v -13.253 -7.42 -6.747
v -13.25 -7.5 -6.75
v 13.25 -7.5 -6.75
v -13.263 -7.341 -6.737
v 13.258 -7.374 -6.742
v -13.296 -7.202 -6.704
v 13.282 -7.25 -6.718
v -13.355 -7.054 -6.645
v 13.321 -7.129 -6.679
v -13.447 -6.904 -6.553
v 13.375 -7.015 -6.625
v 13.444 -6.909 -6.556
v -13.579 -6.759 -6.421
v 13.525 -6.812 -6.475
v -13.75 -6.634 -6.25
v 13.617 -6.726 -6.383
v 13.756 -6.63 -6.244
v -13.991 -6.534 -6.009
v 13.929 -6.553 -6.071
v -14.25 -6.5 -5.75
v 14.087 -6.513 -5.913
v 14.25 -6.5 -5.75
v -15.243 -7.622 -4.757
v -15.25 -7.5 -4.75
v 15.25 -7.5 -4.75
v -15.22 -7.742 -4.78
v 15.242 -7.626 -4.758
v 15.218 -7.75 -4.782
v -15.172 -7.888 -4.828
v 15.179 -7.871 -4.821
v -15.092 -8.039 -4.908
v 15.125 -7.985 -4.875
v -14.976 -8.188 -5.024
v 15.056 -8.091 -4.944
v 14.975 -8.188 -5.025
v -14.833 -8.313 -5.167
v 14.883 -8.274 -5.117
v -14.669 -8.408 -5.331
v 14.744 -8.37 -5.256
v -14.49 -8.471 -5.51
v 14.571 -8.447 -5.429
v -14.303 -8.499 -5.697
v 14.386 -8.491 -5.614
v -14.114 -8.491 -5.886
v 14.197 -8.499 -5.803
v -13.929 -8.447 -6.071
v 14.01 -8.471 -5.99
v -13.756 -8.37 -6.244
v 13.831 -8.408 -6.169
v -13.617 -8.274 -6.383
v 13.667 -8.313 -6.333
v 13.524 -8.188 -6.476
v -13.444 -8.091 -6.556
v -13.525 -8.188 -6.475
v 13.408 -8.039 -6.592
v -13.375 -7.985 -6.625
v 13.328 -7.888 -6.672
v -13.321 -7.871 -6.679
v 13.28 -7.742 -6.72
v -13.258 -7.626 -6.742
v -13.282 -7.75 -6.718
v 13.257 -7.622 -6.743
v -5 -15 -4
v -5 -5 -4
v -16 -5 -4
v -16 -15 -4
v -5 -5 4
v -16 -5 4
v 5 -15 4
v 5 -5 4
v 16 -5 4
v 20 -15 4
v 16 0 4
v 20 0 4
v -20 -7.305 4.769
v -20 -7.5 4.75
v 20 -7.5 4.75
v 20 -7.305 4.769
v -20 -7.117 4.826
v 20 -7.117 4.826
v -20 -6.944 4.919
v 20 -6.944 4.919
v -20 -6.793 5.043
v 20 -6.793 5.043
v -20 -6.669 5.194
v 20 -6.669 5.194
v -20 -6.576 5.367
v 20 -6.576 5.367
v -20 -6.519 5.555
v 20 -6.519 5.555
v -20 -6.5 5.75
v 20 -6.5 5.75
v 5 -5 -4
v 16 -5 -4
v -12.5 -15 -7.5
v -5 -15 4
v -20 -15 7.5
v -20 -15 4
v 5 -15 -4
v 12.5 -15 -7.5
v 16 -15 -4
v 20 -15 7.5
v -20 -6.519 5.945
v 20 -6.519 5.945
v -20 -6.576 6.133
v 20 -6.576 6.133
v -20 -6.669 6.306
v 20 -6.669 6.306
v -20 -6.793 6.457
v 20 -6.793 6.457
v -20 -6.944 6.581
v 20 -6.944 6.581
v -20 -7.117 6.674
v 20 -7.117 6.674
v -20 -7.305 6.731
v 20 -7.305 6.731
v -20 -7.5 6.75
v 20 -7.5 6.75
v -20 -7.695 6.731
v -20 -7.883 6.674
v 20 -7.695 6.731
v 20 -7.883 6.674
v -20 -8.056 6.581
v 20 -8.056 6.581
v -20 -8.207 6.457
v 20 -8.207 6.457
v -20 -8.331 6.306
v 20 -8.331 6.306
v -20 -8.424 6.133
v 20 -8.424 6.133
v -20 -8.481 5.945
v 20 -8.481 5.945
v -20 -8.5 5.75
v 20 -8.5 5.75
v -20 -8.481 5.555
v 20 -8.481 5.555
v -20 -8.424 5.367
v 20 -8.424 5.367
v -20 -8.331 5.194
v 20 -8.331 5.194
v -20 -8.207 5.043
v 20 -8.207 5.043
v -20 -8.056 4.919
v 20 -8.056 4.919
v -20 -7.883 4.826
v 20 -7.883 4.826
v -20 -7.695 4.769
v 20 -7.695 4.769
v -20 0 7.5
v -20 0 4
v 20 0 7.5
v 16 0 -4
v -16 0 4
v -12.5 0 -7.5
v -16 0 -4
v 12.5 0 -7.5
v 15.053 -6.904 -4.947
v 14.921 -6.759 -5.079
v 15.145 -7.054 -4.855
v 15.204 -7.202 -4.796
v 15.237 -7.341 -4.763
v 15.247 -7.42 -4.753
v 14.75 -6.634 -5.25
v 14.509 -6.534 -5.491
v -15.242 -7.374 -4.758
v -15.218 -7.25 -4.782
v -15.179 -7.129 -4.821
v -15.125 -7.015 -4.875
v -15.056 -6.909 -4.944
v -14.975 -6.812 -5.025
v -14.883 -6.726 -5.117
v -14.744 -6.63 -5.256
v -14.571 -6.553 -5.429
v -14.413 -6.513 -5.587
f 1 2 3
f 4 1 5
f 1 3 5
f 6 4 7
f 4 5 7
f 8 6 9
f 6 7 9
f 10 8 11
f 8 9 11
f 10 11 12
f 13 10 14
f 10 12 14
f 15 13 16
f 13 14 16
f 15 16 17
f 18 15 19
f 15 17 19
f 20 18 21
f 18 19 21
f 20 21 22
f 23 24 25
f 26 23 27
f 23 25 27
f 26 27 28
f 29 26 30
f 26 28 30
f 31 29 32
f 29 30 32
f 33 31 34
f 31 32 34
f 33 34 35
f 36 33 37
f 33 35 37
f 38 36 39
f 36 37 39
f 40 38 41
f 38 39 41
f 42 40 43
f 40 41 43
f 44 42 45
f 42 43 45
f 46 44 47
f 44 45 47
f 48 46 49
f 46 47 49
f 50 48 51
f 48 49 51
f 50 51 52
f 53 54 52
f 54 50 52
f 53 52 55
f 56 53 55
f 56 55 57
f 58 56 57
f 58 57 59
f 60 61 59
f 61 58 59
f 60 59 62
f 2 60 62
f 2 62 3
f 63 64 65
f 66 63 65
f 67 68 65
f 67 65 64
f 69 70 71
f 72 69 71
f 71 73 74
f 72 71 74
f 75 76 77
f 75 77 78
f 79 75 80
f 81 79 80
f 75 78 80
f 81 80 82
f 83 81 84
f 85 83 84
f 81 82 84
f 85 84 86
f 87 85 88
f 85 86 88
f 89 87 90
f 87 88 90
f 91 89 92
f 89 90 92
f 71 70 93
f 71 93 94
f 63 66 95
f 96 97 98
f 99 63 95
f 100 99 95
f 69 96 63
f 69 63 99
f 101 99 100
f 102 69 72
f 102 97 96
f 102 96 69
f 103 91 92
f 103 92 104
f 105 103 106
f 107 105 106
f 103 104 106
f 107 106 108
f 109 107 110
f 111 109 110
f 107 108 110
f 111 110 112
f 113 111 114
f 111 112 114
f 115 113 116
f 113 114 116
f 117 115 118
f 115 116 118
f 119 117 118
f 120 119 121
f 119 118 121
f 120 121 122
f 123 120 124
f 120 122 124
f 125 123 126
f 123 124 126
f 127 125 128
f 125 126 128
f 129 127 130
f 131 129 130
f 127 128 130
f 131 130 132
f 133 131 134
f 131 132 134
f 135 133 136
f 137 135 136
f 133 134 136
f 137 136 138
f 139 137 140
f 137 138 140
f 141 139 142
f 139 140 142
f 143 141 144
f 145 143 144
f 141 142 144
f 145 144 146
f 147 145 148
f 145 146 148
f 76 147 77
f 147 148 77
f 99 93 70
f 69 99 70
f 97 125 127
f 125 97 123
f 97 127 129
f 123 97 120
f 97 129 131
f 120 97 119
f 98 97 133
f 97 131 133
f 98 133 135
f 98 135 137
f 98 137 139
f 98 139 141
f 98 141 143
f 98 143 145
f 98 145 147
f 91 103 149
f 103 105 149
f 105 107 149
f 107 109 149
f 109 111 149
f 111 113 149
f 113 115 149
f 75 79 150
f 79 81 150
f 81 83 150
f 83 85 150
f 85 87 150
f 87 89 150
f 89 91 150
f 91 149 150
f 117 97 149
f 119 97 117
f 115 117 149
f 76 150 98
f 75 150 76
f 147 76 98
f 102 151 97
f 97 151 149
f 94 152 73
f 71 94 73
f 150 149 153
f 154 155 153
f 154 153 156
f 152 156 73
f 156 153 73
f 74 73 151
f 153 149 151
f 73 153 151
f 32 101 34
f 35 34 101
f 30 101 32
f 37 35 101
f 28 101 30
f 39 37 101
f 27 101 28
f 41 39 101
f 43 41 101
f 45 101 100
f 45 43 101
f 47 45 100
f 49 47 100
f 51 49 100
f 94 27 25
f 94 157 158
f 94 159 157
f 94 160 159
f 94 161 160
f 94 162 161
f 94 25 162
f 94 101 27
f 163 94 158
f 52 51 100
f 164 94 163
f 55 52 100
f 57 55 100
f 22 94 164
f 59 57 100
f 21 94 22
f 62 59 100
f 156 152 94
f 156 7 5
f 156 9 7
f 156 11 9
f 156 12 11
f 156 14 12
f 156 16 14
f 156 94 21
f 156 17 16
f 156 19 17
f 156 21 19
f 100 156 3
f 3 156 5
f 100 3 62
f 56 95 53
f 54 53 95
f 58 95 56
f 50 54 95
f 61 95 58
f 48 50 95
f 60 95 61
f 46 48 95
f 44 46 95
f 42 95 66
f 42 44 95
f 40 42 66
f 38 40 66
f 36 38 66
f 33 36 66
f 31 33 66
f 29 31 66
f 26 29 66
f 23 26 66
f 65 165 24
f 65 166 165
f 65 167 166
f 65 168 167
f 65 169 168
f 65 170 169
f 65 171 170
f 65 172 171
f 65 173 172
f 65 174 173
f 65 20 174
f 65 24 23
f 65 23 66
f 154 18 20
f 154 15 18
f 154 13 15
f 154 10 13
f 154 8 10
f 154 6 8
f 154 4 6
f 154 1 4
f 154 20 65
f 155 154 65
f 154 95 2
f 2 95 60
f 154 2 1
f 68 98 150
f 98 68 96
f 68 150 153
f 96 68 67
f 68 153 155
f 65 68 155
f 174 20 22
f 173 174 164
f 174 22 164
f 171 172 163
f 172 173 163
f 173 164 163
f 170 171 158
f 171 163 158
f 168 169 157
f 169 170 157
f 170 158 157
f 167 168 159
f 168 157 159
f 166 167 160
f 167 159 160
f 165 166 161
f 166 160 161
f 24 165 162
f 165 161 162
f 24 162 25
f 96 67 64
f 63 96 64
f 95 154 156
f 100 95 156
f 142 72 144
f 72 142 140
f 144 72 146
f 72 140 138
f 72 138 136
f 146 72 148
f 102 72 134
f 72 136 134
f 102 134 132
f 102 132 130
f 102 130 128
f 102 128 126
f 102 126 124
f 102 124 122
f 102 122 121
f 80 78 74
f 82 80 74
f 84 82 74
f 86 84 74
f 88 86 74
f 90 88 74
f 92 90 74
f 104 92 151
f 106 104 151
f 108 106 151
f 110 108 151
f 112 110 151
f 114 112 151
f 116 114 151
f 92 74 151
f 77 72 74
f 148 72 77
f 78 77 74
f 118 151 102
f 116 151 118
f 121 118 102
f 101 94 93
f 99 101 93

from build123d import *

# Parameters (mm, degrees)
F0_W        = 10
F0_H        = 4
F0_W_2      = 11
F1_DEPTH    = 5
F2_DEPTH    = 15
F4_DEPTH    = 40
F5_T1_DEPTH = 33.0017809158


# Not quite as in the source:
# - a fillet or chamfer that OpenCascade refuses, or shapes differently, is made with other operations: its cross-section is extruded or revolved along the edge and cut away or added


with BuildPart() as f1:
    # F0 (on Front) → F1 (new body)
    with BuildSketch(Plane.XZ):
        with Locations((0, 2)):
            Rectangle(F0_W, F0_H)
        with Locations((0, -2)):
            Rectangle(F0_W, F0_H)
        Polygon((16, -4), (5, -4), (-5, -4), (-16, -4), (-16, -7.5), (16, -7.5), align=None)
        Polygon((-5, 4), (5, 4), (16, 4), (20, 4), (20, 7.5), (-20, 7.5), (-20, 4), (-16, 4), align=None)
        with Locations((-10.5, -2)):
            Rectangle(F0_W_2, F0_H)
        with Locations((10.5, -2)):
            Rectangle(F0_W_2, F0_H)
        with Locations((10.5, 2)):
            Rectangle(F0_W_2, F0_H)
        with Locations((-10.5, 2)):
            Rectangle(F0_W_2, F0_H)
    extrude(amount=F1_DEPTH)

    # F0 (on Front) → F2 (join)
    with BuildSketch(Plane.XZ):
        Polygon((-5, 4), (5, 4), (16, 4), (20, 4), (20, 7.5), (-20, 7.5), (-20, 4), (-16, 4), align=None)
        with Locations((0, 2)):
            Rectangle(F0_W, F0_H)
        with Locations((0, -2)):
            Rectangle(F0_W, F0_H)
        Polygon((16, -4), (5, -4), (-5, -4), (-16, -4), (-16, -7.5), (16, -7.5), align=None)
    extrude(amount=F2_DEPTH)

    # F3 (on face) → F4 (cut)
    with BuildSketch(Plane.YZ.offset(20)):
        with BuildLine():
            ThreePointArc((-6.5, -5.75), (-6.7928932188, -5.0428932188), (-7.5, -4.75))
            Line((-7.5, -4.75), (-7.5, -6.75))
            ThreePointArc((-7.5, -6.75), (-6.7928932188, -6.4571067812), (-6.5, -5.75))
        make_face()
        with BuildLine():
            Line((-7.5, -6.75), (-7.5, -4.75))
            ThreePointArc((-7.5, -4.75), (-8.5, -5.75), (-7.5, -6.75))
        make_face()
        with BuildLine():
            ThreePointArc((-7.5, 6.75), (-8.5, 5.75), (-7.5, 4.75))
            Line((-7.5, 4.75), (-7.5, 6.75))
        make_face()
        with BuildLine():
            Line((-7.5, 6.75), (-7.5, 4.75))
            ThreePointArc((-7.5, 4.75), (-6.7928932188, 5.0428932188), (-6.5, 5.75))
            ThreePointArc((-6.5, 5.75), (-6.7928932188, 6.4571067812), (-7.5, 6.75))
        make_face()
    extrude(amount=-F4_DEPTH, mode=Mode.SUBTRACT)

    # F5: chamfer of 3.5 on 2 edges, made by hand

    # F5_s2 → F5_t1 (cut)
    with BuildSketch(Plane.XZ.offset(-9.0008904579)):
        Polygon((-12.5, -7.5), (-16, -4), (-16, -7.5), align=None)
        Polygon((16, -4), (12.5, -7.5), (16, -7.5), align=None)
    extrude(amount=F5_T1_DEPTH, mode=Mode.SUBTRACT)


solid = f1.part
